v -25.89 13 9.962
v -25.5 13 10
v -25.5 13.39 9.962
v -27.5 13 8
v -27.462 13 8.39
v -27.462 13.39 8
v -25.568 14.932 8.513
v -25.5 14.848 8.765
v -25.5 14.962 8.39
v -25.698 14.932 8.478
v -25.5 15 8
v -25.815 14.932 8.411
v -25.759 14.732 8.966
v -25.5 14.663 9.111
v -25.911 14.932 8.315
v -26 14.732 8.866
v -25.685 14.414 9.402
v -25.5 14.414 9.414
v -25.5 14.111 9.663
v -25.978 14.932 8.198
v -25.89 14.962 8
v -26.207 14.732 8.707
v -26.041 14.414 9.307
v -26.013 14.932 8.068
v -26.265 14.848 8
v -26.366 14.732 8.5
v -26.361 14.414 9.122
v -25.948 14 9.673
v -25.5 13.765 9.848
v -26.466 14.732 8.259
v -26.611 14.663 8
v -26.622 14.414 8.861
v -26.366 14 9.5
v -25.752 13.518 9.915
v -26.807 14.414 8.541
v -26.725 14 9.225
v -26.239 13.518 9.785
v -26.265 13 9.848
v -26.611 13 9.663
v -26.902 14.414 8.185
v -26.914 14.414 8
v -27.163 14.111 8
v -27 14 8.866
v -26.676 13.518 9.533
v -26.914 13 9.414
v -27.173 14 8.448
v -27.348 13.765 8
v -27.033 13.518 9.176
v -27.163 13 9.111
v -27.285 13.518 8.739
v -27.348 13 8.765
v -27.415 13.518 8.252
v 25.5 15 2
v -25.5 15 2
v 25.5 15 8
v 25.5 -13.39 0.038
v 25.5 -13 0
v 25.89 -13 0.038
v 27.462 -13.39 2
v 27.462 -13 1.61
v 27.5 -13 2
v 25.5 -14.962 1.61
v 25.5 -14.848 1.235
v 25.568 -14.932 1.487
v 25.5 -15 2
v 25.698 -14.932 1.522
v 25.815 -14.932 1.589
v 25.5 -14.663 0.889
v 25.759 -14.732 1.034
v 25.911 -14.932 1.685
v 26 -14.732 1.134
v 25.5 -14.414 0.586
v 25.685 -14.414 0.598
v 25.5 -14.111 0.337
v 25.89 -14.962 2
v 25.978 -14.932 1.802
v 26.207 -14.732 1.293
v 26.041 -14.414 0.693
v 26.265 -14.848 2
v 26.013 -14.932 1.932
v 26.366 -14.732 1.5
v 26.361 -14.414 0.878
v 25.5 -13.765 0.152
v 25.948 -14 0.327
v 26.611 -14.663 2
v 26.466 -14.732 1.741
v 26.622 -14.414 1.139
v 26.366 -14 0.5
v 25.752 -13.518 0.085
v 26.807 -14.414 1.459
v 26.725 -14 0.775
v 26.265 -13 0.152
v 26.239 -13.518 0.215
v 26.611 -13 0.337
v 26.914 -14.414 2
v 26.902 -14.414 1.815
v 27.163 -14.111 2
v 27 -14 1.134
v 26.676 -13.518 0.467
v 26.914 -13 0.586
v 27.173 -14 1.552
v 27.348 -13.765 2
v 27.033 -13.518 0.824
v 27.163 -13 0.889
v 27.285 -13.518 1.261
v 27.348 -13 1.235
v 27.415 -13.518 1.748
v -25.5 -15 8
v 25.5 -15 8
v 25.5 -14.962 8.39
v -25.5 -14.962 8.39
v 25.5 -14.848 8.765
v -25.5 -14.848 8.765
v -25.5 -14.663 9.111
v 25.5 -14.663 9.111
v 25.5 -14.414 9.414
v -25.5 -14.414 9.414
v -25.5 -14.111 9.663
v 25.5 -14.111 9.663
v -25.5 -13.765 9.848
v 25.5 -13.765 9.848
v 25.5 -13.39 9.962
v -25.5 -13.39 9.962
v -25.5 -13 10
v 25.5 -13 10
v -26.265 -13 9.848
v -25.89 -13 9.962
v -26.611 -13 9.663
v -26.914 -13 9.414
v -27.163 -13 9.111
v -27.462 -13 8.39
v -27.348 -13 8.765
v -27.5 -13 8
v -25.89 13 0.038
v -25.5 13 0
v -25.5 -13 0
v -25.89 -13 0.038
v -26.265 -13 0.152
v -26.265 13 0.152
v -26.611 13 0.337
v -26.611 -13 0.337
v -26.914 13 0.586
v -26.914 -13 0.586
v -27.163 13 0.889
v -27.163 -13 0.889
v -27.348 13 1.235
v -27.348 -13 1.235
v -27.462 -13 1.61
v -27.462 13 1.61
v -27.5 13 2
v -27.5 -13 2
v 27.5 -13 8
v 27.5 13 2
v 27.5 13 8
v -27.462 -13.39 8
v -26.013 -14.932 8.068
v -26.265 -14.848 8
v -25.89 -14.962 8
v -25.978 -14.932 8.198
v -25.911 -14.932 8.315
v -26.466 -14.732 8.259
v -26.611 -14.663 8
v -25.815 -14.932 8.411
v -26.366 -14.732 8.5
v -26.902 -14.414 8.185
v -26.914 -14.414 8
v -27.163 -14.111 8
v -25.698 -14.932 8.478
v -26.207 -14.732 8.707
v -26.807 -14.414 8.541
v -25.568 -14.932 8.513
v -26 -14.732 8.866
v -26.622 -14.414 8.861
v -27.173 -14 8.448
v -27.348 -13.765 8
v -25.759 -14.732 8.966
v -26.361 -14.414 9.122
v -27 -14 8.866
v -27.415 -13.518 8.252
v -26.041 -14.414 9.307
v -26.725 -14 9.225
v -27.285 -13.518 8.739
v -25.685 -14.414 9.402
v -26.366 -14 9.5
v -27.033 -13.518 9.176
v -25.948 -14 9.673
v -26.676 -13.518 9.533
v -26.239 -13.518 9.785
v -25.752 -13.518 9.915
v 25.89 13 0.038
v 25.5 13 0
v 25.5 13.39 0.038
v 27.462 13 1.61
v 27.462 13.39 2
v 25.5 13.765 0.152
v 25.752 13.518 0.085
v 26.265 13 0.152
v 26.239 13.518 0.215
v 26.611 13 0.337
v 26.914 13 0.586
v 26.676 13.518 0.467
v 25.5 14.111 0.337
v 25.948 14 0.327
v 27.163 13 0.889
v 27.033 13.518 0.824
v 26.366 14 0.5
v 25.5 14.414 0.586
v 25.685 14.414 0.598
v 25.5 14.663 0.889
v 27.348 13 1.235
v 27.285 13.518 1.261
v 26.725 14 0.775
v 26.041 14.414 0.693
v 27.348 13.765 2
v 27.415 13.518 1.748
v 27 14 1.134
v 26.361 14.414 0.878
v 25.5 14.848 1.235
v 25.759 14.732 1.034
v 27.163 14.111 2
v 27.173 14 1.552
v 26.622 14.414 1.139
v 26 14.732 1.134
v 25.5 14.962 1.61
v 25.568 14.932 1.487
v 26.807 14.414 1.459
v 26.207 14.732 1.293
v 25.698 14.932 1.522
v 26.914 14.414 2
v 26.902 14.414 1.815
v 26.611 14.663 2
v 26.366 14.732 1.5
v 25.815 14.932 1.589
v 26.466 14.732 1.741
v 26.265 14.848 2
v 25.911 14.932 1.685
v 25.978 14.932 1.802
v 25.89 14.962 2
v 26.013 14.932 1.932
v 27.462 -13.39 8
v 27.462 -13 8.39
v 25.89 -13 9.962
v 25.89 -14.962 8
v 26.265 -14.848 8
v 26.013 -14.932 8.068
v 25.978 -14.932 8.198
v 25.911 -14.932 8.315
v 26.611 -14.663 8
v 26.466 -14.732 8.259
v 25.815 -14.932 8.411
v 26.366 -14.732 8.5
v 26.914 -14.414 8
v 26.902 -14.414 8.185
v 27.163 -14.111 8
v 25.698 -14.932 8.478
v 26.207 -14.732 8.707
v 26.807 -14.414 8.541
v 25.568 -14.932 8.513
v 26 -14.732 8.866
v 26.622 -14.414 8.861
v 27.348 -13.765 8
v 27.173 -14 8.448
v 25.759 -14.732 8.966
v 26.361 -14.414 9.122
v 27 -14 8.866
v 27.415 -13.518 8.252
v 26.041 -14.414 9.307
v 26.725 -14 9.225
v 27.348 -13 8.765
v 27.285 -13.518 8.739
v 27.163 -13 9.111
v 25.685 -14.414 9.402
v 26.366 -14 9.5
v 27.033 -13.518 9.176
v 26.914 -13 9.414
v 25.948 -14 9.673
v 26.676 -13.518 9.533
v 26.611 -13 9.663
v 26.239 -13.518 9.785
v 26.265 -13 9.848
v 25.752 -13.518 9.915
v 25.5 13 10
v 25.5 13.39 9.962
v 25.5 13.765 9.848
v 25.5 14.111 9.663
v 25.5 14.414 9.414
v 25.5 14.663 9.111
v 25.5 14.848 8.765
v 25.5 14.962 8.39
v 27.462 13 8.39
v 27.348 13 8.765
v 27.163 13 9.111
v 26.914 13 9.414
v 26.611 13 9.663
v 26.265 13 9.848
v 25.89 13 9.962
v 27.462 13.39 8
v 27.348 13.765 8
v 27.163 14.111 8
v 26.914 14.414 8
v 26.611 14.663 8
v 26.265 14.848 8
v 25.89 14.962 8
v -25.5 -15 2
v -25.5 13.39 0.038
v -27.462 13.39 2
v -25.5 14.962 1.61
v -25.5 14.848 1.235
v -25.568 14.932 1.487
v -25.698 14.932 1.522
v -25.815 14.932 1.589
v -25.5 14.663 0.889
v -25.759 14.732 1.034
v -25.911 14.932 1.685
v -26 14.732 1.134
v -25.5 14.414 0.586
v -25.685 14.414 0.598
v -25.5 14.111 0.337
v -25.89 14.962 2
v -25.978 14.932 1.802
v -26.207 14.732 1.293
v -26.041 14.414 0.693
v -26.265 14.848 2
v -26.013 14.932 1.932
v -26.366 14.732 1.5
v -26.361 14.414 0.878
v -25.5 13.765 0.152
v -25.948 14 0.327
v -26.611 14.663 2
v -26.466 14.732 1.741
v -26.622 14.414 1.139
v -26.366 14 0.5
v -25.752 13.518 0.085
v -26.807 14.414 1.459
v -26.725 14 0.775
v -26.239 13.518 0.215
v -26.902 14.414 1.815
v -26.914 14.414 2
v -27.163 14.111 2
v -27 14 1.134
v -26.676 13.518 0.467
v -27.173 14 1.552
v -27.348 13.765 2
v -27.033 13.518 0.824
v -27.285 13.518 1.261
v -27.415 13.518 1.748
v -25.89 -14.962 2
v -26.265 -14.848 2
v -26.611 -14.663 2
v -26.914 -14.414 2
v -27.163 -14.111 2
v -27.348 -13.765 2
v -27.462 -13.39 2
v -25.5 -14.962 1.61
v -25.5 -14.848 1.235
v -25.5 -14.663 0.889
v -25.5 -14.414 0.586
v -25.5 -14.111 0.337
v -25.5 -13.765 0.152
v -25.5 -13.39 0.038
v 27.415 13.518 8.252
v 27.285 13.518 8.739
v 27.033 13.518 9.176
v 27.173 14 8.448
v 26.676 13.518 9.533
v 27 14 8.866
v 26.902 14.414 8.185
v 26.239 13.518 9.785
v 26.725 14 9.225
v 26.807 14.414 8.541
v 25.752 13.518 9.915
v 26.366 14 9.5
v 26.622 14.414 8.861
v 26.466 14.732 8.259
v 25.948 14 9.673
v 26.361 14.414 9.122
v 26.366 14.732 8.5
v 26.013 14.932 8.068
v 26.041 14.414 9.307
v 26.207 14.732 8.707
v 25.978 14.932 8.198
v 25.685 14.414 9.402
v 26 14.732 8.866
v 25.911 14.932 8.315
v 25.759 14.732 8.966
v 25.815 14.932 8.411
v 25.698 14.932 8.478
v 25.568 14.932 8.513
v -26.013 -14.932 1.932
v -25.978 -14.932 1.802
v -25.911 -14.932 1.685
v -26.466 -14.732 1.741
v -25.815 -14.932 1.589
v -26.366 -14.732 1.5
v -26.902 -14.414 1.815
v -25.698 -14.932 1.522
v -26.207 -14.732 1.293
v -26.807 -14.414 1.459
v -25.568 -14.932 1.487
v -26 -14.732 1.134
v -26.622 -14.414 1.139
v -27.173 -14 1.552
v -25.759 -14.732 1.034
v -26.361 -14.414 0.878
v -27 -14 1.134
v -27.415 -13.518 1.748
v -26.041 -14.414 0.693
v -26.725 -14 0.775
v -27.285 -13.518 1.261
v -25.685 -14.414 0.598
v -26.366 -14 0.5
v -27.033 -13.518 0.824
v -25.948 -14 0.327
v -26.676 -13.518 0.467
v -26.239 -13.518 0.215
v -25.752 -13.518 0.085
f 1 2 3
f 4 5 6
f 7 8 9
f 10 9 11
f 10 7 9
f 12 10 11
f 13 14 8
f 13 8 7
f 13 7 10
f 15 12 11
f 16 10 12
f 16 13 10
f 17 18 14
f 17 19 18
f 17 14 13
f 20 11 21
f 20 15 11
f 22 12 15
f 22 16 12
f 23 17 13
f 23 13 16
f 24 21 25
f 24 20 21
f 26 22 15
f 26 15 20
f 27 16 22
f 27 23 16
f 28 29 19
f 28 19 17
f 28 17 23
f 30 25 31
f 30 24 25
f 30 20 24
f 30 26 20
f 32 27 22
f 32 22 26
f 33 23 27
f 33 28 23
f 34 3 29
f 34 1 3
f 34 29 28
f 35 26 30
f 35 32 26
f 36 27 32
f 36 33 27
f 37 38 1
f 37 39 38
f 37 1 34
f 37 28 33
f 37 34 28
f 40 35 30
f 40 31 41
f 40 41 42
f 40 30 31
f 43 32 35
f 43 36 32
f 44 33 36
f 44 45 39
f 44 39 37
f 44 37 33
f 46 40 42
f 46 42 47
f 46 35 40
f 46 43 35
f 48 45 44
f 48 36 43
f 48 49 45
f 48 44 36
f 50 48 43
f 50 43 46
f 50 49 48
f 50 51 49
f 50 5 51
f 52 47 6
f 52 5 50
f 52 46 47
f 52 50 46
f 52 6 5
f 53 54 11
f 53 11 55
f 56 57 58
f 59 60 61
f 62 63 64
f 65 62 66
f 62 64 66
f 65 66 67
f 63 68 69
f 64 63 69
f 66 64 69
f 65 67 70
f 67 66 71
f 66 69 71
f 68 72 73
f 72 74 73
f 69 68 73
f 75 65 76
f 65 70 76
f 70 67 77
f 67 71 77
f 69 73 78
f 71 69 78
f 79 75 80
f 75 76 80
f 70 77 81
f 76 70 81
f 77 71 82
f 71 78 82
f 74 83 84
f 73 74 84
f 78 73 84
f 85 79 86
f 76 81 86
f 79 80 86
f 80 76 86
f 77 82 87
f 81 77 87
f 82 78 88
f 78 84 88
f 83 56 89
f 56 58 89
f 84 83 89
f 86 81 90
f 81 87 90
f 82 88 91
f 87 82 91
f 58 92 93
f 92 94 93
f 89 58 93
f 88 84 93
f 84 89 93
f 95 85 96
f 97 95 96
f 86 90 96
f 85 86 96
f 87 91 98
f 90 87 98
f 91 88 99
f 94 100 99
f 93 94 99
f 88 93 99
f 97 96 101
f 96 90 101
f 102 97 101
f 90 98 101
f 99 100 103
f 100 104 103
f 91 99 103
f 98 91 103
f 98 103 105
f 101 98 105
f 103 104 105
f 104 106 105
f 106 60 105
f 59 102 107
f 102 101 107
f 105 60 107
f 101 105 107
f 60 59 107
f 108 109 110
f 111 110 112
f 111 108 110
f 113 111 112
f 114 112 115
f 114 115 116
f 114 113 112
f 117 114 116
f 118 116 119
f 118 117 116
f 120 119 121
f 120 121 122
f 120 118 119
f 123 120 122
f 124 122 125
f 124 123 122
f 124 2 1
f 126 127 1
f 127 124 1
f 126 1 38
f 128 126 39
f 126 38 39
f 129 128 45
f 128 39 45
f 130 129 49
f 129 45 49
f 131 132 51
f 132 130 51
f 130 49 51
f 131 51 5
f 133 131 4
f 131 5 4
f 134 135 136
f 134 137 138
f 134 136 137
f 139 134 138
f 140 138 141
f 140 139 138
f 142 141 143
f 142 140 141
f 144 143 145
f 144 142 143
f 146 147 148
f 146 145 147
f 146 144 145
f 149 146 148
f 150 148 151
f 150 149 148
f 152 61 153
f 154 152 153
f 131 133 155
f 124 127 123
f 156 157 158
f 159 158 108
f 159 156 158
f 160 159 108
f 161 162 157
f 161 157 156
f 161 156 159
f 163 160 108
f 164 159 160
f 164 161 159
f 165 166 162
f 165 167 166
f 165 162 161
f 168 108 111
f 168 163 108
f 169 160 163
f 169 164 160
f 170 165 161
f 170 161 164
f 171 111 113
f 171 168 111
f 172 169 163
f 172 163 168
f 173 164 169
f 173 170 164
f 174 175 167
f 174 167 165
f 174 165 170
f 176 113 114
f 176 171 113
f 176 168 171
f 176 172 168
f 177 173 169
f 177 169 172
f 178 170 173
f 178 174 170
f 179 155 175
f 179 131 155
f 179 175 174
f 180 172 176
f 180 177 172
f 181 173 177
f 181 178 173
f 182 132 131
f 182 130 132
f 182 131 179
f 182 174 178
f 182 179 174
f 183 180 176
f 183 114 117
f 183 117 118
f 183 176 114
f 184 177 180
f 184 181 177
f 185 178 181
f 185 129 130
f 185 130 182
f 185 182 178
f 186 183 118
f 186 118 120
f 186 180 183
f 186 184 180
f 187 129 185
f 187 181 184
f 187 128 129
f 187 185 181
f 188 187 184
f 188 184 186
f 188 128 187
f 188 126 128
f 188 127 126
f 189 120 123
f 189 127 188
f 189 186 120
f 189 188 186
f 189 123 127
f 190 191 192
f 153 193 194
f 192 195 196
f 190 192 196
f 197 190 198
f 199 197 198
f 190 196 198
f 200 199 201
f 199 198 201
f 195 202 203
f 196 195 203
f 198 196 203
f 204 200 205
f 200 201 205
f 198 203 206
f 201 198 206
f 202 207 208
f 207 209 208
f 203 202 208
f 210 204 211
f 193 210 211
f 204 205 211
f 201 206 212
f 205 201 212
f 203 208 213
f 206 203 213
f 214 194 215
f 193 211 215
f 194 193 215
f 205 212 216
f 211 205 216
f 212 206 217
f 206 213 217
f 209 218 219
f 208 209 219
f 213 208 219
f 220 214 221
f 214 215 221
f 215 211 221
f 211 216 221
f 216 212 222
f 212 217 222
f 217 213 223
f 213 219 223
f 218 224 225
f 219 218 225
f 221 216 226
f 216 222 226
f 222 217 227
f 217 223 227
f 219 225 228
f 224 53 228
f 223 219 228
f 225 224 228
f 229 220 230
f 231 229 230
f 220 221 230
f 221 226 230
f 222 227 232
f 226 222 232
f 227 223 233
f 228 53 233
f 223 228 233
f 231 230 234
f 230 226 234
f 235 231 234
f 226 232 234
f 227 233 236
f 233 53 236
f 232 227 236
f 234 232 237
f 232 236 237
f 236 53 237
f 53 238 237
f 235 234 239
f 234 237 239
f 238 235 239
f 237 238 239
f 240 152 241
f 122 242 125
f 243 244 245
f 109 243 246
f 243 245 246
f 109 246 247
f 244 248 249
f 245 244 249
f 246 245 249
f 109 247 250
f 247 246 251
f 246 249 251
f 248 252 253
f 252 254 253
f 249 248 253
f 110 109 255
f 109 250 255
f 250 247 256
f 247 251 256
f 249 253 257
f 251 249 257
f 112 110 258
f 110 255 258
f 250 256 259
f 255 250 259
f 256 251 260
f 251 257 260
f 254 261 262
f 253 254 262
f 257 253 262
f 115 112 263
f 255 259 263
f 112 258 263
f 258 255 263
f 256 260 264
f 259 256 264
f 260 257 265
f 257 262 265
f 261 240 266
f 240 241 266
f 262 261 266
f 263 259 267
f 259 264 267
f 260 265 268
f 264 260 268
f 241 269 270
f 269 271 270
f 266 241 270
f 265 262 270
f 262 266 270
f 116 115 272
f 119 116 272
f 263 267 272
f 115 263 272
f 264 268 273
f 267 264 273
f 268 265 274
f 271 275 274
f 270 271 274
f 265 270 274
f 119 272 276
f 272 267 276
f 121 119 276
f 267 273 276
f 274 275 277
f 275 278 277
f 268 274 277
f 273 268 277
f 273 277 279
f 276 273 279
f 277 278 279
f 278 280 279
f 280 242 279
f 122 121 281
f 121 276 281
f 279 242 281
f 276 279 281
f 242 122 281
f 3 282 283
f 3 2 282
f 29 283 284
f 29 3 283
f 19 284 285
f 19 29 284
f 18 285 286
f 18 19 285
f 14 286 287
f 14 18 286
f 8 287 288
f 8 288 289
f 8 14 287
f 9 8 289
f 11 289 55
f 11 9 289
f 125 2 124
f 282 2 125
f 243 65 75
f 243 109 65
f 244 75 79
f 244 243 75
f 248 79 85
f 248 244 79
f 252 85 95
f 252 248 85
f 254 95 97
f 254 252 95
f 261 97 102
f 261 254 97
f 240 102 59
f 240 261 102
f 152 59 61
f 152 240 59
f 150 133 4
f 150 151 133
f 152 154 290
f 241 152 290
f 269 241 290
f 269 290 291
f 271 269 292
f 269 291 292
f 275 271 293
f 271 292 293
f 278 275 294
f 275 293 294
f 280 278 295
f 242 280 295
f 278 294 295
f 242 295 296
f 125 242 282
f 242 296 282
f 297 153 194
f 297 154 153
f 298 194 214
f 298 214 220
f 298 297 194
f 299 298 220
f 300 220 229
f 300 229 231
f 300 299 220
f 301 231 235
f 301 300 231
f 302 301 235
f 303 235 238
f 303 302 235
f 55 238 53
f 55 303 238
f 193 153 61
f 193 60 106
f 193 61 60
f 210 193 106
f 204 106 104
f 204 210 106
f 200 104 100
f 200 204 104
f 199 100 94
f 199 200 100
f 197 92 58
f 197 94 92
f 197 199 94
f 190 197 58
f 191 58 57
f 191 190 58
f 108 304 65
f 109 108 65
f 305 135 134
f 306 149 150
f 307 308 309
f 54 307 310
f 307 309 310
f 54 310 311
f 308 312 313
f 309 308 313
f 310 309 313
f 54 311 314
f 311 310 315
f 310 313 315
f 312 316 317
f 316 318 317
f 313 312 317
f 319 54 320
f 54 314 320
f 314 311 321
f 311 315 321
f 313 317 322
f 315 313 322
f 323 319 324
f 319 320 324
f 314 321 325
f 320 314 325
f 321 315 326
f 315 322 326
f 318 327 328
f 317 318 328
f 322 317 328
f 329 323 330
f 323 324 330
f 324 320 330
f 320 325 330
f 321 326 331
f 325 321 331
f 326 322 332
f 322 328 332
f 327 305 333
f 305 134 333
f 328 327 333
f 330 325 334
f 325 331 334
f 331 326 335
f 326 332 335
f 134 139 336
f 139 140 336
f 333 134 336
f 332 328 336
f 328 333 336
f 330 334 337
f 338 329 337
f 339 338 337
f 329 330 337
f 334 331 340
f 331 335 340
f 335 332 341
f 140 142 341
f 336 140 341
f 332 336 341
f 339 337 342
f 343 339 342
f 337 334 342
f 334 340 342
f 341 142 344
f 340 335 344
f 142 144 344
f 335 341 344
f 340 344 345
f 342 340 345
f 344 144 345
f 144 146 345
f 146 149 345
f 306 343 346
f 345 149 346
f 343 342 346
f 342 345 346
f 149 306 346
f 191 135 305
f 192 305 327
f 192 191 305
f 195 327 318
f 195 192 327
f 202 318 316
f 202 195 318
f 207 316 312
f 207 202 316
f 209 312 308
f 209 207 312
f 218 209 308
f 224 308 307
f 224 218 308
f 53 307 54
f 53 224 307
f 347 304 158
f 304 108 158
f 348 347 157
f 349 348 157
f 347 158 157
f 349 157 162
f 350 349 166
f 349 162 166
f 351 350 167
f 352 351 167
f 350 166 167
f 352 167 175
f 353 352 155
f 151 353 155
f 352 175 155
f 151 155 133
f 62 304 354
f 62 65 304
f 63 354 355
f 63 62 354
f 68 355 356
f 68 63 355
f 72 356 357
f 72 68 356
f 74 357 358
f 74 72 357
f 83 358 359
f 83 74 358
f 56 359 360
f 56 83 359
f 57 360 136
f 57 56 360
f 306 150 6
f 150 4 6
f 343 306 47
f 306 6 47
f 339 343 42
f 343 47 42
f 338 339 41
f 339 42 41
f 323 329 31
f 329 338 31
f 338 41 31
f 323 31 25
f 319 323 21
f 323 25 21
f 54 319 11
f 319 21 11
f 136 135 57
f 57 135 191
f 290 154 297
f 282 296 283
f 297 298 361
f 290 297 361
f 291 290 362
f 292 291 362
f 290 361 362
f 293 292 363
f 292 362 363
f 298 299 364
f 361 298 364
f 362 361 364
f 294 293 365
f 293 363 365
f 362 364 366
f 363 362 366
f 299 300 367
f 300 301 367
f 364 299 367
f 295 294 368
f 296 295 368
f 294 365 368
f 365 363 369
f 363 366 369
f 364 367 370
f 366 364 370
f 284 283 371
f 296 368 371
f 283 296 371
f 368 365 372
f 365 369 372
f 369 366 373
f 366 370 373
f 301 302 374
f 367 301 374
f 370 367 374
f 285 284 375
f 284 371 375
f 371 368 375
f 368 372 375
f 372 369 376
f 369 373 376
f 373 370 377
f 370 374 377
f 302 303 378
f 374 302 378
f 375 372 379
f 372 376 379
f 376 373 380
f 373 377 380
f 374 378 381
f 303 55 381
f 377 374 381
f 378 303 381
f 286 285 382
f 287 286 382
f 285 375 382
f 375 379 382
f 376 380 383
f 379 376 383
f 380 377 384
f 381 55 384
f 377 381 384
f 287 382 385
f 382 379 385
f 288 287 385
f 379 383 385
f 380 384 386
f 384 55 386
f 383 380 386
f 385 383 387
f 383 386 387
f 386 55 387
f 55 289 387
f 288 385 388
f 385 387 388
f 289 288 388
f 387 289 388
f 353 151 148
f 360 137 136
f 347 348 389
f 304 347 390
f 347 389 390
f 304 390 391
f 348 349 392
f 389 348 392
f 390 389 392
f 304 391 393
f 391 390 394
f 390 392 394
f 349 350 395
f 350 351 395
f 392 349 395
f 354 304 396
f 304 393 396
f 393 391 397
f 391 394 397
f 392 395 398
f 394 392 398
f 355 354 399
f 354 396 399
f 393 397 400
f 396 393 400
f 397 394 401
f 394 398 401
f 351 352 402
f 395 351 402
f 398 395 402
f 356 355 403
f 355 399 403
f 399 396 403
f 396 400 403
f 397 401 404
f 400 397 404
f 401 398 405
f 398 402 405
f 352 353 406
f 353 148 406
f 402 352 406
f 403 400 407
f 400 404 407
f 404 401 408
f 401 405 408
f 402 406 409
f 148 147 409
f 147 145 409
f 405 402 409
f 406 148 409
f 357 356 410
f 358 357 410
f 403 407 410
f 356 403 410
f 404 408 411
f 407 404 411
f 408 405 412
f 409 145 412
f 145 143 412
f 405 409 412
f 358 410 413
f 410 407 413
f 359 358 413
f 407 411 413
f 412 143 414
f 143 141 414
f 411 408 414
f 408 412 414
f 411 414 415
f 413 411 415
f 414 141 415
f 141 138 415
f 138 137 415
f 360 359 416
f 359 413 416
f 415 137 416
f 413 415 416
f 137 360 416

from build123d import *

# Parameters (mm, degrees)
F0_W     = 55
F0_H     = 30
F1_DEPTH = 10
F2_R     = 2
F3_R     = 2


with BuildPart() as f1:
    # F0 (on Top) → F1 (new body)
    with BuildSketch(Plane.XY):
        Rectangle(F0_W, F0_H)
    extrude(amount=F1_DEPTH)

    # F2
    f2_edges = [f1.edges().sort_by_distance(p)[0] for p in [
        (27.5, 0, 0),
        (27.5, 0, 10),
    ]]
    fillet(f2_edges, radius=F2_R)

    # F3
    f3_edges = [f1.edges().sort_by_distance(p)[0] for p in [
        (-27.5, 0, 10),
        (-27.5, 0, 0),
        (-27.5, -15, 5),
        (27.5, -15, 5),
        (27.5, 15, 5),
        (26.914214, 15, 0.585786),
        (26.914214, 15, 9.414214),
        (-1, 15, 0),
        (-1, 15, 10),
        (-27.5, 15, 5),
    ]]
    fillet(f3_edges, radius=F3_R)


solid = f1.part
